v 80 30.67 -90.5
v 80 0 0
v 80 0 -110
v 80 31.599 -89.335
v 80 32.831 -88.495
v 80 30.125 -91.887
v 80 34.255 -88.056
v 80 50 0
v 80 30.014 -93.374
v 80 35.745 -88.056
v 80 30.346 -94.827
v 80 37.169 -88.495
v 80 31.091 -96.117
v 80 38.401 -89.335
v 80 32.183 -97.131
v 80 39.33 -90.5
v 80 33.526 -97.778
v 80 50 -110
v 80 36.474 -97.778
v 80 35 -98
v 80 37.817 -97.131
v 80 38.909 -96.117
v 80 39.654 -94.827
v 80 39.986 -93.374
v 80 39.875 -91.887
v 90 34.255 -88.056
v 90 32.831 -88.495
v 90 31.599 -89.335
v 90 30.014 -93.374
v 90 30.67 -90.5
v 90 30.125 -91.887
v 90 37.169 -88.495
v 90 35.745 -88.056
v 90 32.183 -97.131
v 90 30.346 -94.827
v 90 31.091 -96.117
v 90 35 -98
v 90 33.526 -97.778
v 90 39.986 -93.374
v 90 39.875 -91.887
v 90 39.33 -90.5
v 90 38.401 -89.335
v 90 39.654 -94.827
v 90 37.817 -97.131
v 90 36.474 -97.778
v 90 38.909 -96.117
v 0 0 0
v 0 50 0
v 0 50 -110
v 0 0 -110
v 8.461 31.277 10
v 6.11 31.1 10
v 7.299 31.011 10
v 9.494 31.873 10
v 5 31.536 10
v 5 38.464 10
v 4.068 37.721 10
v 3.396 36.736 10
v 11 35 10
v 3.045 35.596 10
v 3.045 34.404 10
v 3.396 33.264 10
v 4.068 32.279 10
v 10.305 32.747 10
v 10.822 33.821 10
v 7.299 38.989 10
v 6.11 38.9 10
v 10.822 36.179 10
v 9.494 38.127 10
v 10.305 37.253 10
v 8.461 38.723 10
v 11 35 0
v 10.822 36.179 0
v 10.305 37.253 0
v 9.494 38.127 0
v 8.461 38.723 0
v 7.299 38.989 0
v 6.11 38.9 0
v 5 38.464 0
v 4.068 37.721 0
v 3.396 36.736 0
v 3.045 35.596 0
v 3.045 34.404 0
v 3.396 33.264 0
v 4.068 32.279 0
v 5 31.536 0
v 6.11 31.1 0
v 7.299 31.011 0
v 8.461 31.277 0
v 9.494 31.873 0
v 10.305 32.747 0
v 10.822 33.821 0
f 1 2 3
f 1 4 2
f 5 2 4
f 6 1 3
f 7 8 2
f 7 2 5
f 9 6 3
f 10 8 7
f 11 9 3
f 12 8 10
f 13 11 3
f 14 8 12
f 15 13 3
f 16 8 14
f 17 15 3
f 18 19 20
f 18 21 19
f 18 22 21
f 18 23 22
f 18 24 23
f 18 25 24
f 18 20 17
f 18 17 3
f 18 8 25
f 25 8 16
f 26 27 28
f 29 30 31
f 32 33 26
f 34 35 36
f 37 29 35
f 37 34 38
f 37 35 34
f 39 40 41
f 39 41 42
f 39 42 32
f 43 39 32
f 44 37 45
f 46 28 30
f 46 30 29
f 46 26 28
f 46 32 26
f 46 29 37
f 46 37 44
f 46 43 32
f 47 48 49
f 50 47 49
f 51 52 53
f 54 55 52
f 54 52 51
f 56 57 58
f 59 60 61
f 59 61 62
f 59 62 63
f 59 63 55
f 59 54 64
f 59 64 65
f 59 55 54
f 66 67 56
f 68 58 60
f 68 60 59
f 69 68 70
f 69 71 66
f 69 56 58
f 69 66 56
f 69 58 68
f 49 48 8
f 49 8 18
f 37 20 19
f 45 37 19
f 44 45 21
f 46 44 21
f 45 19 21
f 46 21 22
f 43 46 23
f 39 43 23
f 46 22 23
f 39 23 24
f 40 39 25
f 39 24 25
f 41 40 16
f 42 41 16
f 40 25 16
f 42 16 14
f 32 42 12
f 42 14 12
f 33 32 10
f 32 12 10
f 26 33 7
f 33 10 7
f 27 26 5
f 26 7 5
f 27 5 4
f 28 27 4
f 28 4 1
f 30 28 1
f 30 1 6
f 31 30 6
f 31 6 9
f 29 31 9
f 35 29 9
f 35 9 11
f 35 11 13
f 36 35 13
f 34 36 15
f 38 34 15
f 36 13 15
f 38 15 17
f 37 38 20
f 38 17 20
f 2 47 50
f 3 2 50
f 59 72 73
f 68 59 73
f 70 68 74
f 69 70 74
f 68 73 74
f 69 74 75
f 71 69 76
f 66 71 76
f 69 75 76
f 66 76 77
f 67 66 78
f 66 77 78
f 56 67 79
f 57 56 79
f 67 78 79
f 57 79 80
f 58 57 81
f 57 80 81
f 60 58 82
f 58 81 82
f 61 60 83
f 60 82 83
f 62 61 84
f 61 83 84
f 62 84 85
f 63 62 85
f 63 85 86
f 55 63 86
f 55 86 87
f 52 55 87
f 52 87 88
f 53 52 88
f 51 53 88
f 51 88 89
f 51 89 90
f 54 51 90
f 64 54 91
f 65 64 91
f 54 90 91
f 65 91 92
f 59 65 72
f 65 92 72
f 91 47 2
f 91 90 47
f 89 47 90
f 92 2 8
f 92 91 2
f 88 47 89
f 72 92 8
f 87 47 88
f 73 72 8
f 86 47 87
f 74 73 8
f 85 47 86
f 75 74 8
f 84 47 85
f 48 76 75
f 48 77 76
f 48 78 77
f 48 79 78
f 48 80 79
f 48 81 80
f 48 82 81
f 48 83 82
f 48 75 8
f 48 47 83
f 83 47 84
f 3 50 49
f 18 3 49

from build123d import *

# Parameters (mm, degrees)
SKETCH1_W           = 110
SKETCH1_H           = 50
BOSS_EXTRUDE1_DEPTH = 80
SKETCH2_R           = 4
BOSS_EXTRUDE2_DEPTH = 10
SKETCH3_R           = 5
BOSS_EXTRUDE3_DEPTH = 10


with BuildPart() as part:
    # Sketch1 → Boss-Extrude1 (new body)
    with BuildSketch(Plane(origin=(0, 0, 0), x_dir=(0, 0, -1), z_dir=(1, 0, 0))):
        with Locations((55, 25)):
            Rectangle(SKETCH1_W, SKETCH1_H)
    extrude(amount=BOSS_EXTRUDE1_DEPTH)

    # Sketch2 → Boss-Extrude2 (add)
    with BuildSketch(Plane.XY):
        with Locations((7, 35)):
            Circle(SKETCH2_R)
    extrude(amount=BOSS_EXTRUDE2_DEPTH)

    # Sketch3 → Boss-Extrude3 (add)
    with BuildSketch(Plane(origin=(80, 0, 0), x_dir=(0, 0, -1), z_dir=(1, 0, 0))):
        with Locations((93, 35)):
            Circle(SKETCH3_R)
    extrude(amount=BOSS_EXTRUDE3_DEPTH)


solid = part.part
